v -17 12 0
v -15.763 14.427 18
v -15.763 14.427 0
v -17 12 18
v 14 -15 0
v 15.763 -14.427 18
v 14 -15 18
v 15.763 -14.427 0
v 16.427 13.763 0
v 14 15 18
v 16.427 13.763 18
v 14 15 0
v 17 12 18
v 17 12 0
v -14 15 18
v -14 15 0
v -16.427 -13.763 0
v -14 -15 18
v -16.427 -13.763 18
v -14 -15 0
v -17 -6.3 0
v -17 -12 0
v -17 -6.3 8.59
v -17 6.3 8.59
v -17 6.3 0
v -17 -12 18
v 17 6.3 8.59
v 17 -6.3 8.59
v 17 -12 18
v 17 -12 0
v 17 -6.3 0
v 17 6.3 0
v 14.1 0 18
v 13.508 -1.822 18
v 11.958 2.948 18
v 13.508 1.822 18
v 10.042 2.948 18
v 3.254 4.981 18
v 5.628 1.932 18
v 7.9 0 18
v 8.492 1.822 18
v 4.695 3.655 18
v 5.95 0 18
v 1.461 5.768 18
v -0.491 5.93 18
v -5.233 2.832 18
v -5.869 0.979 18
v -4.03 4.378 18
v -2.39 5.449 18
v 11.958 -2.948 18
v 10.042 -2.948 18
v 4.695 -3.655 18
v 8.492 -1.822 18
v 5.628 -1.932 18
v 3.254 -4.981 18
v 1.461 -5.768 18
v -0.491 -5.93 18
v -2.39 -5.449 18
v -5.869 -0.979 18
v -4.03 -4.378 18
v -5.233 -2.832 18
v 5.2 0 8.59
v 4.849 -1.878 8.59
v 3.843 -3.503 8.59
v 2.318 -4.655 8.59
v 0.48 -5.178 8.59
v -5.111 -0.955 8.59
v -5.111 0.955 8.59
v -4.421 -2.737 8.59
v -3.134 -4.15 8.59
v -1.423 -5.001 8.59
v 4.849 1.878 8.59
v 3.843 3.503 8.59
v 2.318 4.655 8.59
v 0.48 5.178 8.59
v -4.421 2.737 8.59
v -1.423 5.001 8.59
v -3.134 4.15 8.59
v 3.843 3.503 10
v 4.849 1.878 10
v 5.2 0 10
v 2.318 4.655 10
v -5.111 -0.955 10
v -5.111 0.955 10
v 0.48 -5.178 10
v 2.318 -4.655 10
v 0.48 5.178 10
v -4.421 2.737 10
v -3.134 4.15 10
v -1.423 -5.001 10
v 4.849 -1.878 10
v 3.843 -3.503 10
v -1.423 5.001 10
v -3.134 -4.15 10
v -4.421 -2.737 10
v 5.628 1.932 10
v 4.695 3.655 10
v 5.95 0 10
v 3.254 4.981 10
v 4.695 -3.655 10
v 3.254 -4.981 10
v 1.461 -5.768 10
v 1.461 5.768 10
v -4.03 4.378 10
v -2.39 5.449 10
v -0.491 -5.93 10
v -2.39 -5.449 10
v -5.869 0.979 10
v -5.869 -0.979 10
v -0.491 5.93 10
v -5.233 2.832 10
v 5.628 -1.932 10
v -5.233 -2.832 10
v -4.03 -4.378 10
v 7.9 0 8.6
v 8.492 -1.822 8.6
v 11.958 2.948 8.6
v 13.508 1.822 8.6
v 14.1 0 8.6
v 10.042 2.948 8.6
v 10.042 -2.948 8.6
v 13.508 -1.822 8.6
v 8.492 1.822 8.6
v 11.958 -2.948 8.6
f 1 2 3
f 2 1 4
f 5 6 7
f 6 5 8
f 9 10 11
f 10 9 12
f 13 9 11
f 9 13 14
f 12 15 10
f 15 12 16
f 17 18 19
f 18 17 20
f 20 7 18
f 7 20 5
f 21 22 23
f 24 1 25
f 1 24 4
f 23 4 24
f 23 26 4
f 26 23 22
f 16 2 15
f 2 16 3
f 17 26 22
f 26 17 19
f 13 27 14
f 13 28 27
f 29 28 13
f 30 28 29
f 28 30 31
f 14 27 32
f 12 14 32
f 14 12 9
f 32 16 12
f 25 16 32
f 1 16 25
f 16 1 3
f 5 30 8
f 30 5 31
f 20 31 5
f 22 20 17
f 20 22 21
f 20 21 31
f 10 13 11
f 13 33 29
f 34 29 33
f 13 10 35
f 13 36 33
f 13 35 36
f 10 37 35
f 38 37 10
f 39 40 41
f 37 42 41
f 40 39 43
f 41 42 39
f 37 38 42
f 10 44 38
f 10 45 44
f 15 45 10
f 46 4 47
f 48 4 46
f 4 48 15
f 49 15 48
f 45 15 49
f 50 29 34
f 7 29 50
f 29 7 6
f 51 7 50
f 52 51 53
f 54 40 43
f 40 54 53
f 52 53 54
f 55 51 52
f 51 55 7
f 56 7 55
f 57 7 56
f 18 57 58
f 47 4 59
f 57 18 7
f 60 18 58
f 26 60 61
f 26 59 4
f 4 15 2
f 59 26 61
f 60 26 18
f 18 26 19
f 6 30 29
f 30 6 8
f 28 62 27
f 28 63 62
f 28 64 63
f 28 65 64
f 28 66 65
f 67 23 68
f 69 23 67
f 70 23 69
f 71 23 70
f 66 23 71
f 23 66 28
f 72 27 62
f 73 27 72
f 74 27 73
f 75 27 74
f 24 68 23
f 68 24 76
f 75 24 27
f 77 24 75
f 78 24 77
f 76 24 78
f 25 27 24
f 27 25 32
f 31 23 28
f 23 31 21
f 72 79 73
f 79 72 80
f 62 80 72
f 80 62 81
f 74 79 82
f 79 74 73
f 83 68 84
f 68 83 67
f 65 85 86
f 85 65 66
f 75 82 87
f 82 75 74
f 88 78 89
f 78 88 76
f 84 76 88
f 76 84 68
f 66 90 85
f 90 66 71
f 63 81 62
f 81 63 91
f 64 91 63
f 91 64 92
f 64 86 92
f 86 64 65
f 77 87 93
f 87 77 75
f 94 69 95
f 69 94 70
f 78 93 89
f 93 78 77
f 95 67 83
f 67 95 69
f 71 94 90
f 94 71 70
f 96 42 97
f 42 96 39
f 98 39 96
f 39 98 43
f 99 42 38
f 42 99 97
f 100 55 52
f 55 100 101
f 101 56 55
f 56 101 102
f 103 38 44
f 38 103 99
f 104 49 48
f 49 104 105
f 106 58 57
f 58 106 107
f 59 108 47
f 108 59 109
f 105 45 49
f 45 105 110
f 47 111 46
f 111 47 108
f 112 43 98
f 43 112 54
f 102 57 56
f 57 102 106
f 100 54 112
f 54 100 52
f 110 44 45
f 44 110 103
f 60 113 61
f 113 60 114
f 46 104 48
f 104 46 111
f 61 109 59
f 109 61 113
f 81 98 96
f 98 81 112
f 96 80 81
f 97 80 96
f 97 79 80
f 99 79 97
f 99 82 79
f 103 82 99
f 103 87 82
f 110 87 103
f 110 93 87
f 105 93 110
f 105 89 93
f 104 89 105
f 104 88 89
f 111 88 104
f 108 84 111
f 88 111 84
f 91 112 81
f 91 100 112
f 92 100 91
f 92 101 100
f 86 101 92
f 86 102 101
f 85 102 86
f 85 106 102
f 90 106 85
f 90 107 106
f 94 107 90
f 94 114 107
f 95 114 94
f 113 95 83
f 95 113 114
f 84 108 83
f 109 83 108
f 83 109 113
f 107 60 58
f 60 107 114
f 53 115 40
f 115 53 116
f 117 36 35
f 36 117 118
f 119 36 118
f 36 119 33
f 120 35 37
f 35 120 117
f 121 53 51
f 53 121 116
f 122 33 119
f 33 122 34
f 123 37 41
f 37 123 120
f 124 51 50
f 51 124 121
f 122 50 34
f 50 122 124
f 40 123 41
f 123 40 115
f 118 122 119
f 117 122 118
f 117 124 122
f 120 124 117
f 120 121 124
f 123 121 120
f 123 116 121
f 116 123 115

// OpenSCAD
// file: frame.scad
// ============================================================================
//  RIBBED FRAME HELPER — replaces a solid plate with border + grid ribs.
//  Same stiffness where it matters (bosses clamped flat), ~half the plastic.
// ============================================================================

rib_w    = 10;   // [mm] grid rib width
border_w = 10;   // [mm] perimeter border width

// Plan-view rounded rectangle prism — trims vertical edges to radius r.
// Inset polygon + offset(r) keeps the flat edges on x0/x1/y0/y1.
module rounded_outline(x0, y0, x1, y1, h, r = corner_r) {
    translate([0, 0, -0.05])
        linear_extrude(h + 0.1)
            offset(r = r)
                polygon([[x0 + r, y0 + r],
                         [x1 - r, y0 + r],
                         [x1 - r, y1 - r],
                         [x0 + r, y1 - r]]);
}

// Rounded box helper for external edges. Keep radii small to preserve fits.
module rounded_box(size, r = edge_break) {
    // 2D rounded footprint extruded to preserve exact outer dimensions.
    translate([0,0,-size[2]/2]) linear_extrude(size[2])
        offset(r=r) square([size[0]-2*r,size[1]-2*r],center=true);
}

// x0,y0,x1,y1 = plate extent; xs/ys = station coordinates the ribs run through
module rib_plate(x0, y0, x1, y1, xs, ys) {
    intersection() {
        union() {
        // border ring
        translate([(x0+x1)/2, y0+border_w/2, base_t/2]) rounded_box([x1-x0,border_w,base_t]);
        translate([(x0+x1)/2, y1-border_w/2, base_t/2]) rounded_box([x1-x0,border_w,base_t]);
        translate([x0+border_w/2, (y0+y1)/2, base_t/2]) rounded_box([border_w,y1-y0,base_t]);
        translate([x1-border_w/2, (y0+y1)/2, base_t/2]) rounded_box([border_w,y1-y0,base_t]);
        // ribs through each station row/column
        for (y = ys)
            translate([(x0+x1)/2, y, base_t/2])
                rounded_box([x1-x0, rib_w, base_t]);
        for (x = xs)
            translate([x, (y0+y1)/2, base_t/2])
                rounded_box([rib_w, y1-y0, base_t]);
        }
        rounded_outline(x0, y0, x1, y1, base_t);
    }
}

module pin_post(x, y) {
    translate([x, y, base_t - pin_embed]) {
        cylinder(d = pin_d, h = pin_embed + pin_len - chamfer_h);
        translate([0, 0, pin_embed + pin_len - chamfer_h])
            cylinder(d1 = pin_d, d2 = pin_d - 2 * chamfer_d, h = chamfer_h);
    }
}

module guide_boss(x, y) {
    translate([x, y, base_t])
        cylinder(d = boss_od, h = boss_h);
}

module guide_bores(x, y) {
    translate([x, y, base_t + boss_h - bush_seat_h])
        cylinder(d = bush_hole_d, h = bush_seat_h + 0.02);
    translate([x, y, -0.01])
        cylinder(d = bit_clear_d, h = base_t + boss_h + 0.02);
}
// file: params.scad
// ============================================================================
//  SHARED PARAMETERS — pegboard jig print set
//  10mm holes on a 50mm grid, 18mm plywood, first hole 25mm from each edge.
//  Include this file in every part so dimensions stay in sync.
// ============================================================================

pitch        = 50;    // [mm] grid spacing
hole_d       = 10;    // [mm] drilled hole / bit size (reference)
edge_offset  = 25;    // [mm] first hole centre from each edge
panel_t      = 18;    // [mm] plywood thickness (fence reach below z=0)

// Locating pins — drop into drilled holes. All pin parts print PINS-UP.
pin_d      = 9.8;     // snug in a 10mm hole (9.9 tighter, 9.5 looser)
pin_len    = 10;      // engagement depth
pin_embed  = 3;       // root embedded in the base
chamfer_h  = 1.2;
chamfer_d  = 0.7;

// Drill guides — 12mm OD / 10mm ID metal bush press fit
bush_hole_d  = 11.9;  // press-fit seat (11.7 tighter, 12.1 slip+glue)
bit_clear_d  = 10.4;  // 0.2mm/side clearance
bush_seat_h  = 8;
boss_od      = 24;
boss_h       = 8;

// Base plates
base_t       = 6;
margin       = boss_od / 2 + 6;   // plate margin around stations

// Fence joint — must match between plate notches and fence tabs
notch_d      = 8.4;
notch_w      = 12;
tab_w        = 10;
tab_t        = 4.4;
tab_z0       = 0.3;
tab_in       = 8;
tab_frac     = [0.18, 0.5, 0.82];
fence_t      = 4;
fence_top    = 14;
clamp_gap    = 25;
edge_margin  = 15;
clamp_hole_d = 6;

// Edge rounding — plan-view corner radius, helps high-speed printing
corner_r     = 6;      // [mm] on plates / rib frames
corner_r_s   = 3;      // [mm] on small parts (carriage, inserts)
edge_break   = 0.8;    // [mm] small chamfer on exposed vertical-part edges

// Fence→plate screws — horizontal M3 self-tappers through the fence
// wall into the plate edge band, in the solid gaps between notches.
// Shared by plate (pilot) and fence (through) so positions always match.
screw_d       = 3;      // [mm] M3
screw_clear   = 3.4;    // through-hole Ø in the fence wall
screw_pilot   = 2.4;    // pilot hole Ø into the plate edge
screw_depth   = 9.5;    // pilot depth — stays inside the 10mm border band
screw_z       = 3;      // hole centre height (mid plate thickness)
screw_min_gap = 10;     // smallest solid edge interval that takes a screw

// Solid intervals along a fence edge = reach minus the notch pockets.
// Returns centre positions for the screw holes (same on both parts).
function screw_stations(reach, tab_pos) =
    let(
        flat   = [for (c = tab_pos, e = [-notch_w / 2, notch_w / 2]) c + e],
        bounds = concat([0], flat, [reach]),
        pairs  = [for (i = [0 : 2 : len(bounds) - 2])
                      [bounds[i], bounds[i + 1]]]
    )
    [for (p = pairs) if (p[1] - p[0] >= screw_min_gap)
        (p[0] + p[1]) / 2];
// main file
// ============================================================================
//  RAIL CARRIAGE — Proposal 4
//  Drops over the rail beam: a 12.6 x 8.6 channel in the bottom face
//  straddles the 12 x 8 track. Bush seat + bore at centre. Lock hole
//  takes rail_key.
//  PRINT: as modelled — slot faces the bed; the 12.6mm tunnel roof
//  bridges in one layer. No supports.
// ============================================================================
include <params.scad>
include <frame.scad>

block_x = 34;         // along the rail
block_y = 30;         // across the rail
block_z = 18;
slot_w  = 12.6;       // rail beam 12 + 0.6 clearance
slot_d  = 8.6;        // rail beam 8 + 0.6 clearance
lock_d  = 6.2;

module rail_carriage() {
    difference() {
        intersection() {
            translate([0, 0, block_z/2])
                rounded_box([block_x, block_y, block_z], corner_r_s);
            rounded_outline(-block_x / 2, -block_y / 2,
                            block_x / 2, block_y / 2, block_z,
                            corner_r_s);
        }
        // bottom slot that straddles the rail (open at z=0 face)
        translate([-block_x / 2 - 0.01, -slot_w / 2, -0.01])
            cube([block_x + 0.02, slot_w, slot_d]);
        // drill bore + bush seat
        translate([0, 0, -0.01])
            cylinder(d = bit_clear_d, h = block_z + 0.02);
        translate([0, 0, block_z - bush_seat_h])
            cylinder(d = bush_hole_d, h = bush_seat_h + 0.02);
        // lock key hole (through top into the slot)
        translate([block_x / 2 - 6, 0, slot_d])
            cylinder(d = lock_d, h = block_z - slot_d + 0.02);
    }
}

rail_carriage();
